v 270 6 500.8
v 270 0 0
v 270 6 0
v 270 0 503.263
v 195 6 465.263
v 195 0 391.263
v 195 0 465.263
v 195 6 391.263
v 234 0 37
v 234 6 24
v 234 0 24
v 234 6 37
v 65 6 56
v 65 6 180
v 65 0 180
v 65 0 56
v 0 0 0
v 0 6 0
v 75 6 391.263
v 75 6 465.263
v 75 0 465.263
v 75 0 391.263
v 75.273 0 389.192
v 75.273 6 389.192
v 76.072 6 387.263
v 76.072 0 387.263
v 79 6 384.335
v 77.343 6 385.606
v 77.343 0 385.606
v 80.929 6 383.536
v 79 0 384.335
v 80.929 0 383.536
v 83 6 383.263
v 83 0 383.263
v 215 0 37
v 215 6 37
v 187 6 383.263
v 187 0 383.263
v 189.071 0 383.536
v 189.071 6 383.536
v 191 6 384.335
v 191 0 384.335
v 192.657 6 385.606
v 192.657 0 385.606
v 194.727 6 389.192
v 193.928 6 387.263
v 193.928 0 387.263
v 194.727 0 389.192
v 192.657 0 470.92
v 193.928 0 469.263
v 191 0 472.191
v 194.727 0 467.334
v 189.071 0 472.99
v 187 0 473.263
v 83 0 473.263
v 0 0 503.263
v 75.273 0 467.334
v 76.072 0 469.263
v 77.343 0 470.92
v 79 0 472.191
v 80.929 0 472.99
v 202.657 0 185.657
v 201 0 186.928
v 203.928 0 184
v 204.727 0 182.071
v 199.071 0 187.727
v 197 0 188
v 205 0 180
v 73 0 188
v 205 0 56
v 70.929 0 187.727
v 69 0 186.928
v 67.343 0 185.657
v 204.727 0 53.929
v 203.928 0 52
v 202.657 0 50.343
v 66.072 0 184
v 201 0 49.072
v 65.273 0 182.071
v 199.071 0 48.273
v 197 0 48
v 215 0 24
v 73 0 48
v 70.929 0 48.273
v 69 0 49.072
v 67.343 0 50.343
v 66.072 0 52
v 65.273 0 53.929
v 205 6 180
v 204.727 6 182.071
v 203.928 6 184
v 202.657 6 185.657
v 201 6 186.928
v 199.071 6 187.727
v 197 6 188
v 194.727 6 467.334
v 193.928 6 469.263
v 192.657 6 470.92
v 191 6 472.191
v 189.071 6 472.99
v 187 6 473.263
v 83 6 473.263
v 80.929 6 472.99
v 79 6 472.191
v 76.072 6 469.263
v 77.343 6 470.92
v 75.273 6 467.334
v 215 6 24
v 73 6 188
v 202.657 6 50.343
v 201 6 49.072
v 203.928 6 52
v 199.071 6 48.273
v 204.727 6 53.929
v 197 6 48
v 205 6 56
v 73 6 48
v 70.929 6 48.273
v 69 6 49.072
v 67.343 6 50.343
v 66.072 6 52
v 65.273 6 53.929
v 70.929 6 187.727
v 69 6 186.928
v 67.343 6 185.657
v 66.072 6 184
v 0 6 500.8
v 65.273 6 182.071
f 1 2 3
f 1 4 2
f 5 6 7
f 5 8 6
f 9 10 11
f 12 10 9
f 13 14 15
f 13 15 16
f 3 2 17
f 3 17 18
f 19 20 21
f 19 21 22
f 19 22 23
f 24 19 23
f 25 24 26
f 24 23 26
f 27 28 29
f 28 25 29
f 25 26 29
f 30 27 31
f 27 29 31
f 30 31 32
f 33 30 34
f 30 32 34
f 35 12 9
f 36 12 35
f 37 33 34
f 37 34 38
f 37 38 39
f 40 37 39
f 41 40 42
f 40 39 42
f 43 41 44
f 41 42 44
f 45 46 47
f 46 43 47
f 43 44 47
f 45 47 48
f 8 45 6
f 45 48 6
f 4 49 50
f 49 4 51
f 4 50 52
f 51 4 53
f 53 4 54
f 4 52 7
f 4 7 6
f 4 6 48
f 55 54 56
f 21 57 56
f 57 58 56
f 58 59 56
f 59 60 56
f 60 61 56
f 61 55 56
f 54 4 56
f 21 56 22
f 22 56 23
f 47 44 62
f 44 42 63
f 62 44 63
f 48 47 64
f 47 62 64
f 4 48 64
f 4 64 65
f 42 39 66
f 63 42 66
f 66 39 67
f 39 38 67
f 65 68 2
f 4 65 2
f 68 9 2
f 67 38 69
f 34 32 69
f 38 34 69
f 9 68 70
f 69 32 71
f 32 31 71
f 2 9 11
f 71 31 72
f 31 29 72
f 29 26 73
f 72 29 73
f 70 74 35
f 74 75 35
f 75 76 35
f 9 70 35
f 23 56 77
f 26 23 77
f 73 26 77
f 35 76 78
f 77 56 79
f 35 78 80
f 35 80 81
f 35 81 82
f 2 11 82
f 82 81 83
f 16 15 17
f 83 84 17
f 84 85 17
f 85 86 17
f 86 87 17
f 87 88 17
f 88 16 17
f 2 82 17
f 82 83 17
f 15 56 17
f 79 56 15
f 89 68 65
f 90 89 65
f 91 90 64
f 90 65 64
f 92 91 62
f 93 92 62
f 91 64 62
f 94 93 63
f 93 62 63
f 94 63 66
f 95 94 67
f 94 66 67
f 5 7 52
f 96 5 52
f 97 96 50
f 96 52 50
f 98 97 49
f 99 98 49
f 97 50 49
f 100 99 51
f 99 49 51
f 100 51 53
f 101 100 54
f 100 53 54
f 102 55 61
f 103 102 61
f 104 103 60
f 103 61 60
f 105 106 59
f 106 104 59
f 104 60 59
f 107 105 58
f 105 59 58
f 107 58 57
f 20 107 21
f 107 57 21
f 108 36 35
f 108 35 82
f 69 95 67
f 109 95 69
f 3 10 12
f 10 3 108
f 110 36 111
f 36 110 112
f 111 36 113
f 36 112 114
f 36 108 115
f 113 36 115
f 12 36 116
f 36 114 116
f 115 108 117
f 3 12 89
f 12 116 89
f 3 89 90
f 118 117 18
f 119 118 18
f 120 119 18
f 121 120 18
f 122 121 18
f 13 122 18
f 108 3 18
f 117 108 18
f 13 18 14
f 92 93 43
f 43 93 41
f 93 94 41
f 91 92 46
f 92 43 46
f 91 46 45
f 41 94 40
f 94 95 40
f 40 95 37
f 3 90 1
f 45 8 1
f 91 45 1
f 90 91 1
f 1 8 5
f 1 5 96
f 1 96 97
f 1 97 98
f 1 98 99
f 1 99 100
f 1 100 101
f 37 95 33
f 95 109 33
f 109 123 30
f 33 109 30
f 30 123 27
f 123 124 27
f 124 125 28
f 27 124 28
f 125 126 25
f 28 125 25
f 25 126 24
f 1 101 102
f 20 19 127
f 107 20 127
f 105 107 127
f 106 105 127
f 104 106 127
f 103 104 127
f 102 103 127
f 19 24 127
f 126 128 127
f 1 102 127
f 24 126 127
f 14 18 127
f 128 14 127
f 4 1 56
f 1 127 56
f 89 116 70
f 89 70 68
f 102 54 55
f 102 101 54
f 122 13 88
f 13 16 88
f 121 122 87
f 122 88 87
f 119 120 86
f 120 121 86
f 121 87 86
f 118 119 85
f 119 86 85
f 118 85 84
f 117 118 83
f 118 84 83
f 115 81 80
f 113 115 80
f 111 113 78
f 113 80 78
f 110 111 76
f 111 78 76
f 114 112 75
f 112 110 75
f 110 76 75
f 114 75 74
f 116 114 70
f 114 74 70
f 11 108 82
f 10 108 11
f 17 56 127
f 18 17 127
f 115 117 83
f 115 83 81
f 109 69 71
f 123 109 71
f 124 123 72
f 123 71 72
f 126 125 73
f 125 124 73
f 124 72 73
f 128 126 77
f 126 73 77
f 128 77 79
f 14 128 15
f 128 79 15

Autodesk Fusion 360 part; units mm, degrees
sketch "Back Panel" plane through (0, 0, 0) normal (1, 0, 0) x (0, 1, 0)
  line L0 (0, 0) -> (6, 0)
  line L1 (6, 0) -> (6, 500.8)
  line L2 (0, 500.8) -> (0, 0)
  line L3 (0, 500.8) -> (0, 503.263)
  line L4 (6, 500.8) -> (0, 503.263)
  dimension "d8" = 6
  dimension "d9" = 500.8
  dimension "d10" = 2.463
  dimension "d11" = 112.318
extrude "Extrude2" add sketch "Back Panel" along normal blind 270
sketch "Switch Hole" plane through (0, 6, 0) normal (0, 1, 0) x (-1, 0, 0)
  line L0 (0, 0) -> (0, 500.8)
  line L1 (0, 500.8) -> (-270, 500.8)
  line L2 (-270, 500.8) -> (-270, 0)
  line L3 (-270, 0) -> (0, 0)
  line L4 (-234, 37) -> (-215, 37)
  line L5 (-215, 37) -> (-215, 24)
  line L6 (-215, 24) -> (-234, 24)
  line L7 (-234, 24) -> (-234, 37)
  dimension "d14" = 19
  dimension "d15" = 13
  dimension "d16" = 36
  dimension "d17" = 24
extrude "Extrude3" cut sketch "Switch Hole" against normal blind 6 contours L4 L5 L6 L7
sketch "Bottom Access Panel" plane through (0, 6, 0) normal (0, 1, 0) x (-1, 0, 0)
  line L0 (-215, 37) -> (-215, 24)
  line L1 (-215, 24) -> (-234, 24)
  line L2 (-234, 24) -> (-234, 37)
  line L3 (-234, 37) -> (-215, 37)
  line L4 (0, 0) -> (0, 500.8)
  line L5 (0, 500.8) -> (-270, 500.8)
  line L6 (-270, 500.8) -> (-270, 0)
  line L7 (-270, 0) -> (0, 0)
  line L8 (-205, 188) -> (-65, 188)
  line L9 (-65, 188) -> (-65, 48)
  line L10 (-65, 48) -> (-205, 48)
  line L11 (-205, 48) -> (-205, 188)
  dimension "d20" = 48
  dimension "d21" = 65
  dimension "d22" = 65
  dimension "d28" = 140
  dimension "d29" = 140
  dimension "d30" = 24
  dimension "d31" = 11
  dimension "d32" = 13
  dimension "d33" = 188
extrude "Extrude4" cut sketch "Bottom Access Panel" against normal blind 6 contours L8 L9 L10 L11
fillet "Fillet1" radius 8 4 edges at (65, 3, 188) (65, 3, 48) (205, 3, 48) (205, 3, 188)
sketch "Top Access Panel" plane through (0, 6, 0) normal (0, 1, 0) x (-1, 0, 0)
  line L0 (-65, 180) -> (-65, 56)
  arc A0 (-73, 48) -> (-65, 56) centre (-73, 56) ccw
  line L1 (-73, 48) -> (-197, 48)
  arc A1 (-205, 56) -> (-197, 48) centre (-197, 56) ccw
  line L2 (-205, 56) -> (-205, 180)
  arc A2 (-197, 188) -> (-205, 180) centre (-197, 180) ccw
  line L3 (-197, 188) -> (-73, 188)
  arc A3 (-65, 180) -> (-73, 188) centre (-73, 180) ccw
  line L4 (-215, 37) -> (-215, 24)
  line L5 (-215, 24) -> (-234, 24)
  line L6 (-234, 24) -> (-234, 37)
  line L7 (-234, 37) -> (-215, 37)
  line L8 (0, 0) -> (0, 500.8)
  line L9 (0, 500.8) -> (-270, 500.8)
  line L10 (-270, 500.8) -> (-270, 0)
  line L11 (-270, 0) -> (0, 0)
  line L12 (-195, 473.263) -> (-75, 473.263)
  line L13 (-75, 473.263) -> (-75, 383.263)
  line L14 (-75, 383.263) -> (-195, 383.263)
  line L15 (-195, 383.263) -> (-195, 473.263)
  line L16 (-180, 473.263) -> (-90, 473.263)
  line L17 (0, 503.263) -> (-270, 503.263)
  dimension "d34" = 120
  dimension "d35" = 140
  dimension "d36" = 75
  dimension "d37" = 75
  dimension "d38" = 65
  dimension "d39" = 65
  dimension "d45" = 90
  dimension "d49" = 30
extrude "Extrude5" cut sketch "Top Access Panel" against normal blind 6 contours L12 L13 L14 L15 L16
fillet "Fillet2" radius 8 4 edges at (75, 3, 473.263) (195, 3, 473.263) (195, 3, 383.263) (75, 3, 383.263)
equation "MDFThickness = 6 mm" comment "Thickness of the MDF board"
equation "d16 = ( 18 * 2 ) * 1 mm"
equation "d17 = ( 12 * 2 ) * 1 mm"
equation "d18 = -MDFThickness"
equation "d23 = -MDFThickness"
equation "filletRadius = 8 mm" comment "Radius to use for fillets"
equation "d27 = filletRadius"
equation "d36 = ( ( 270 - 120 ) / 2 ) * 1 mm"
equation "d51 = -MDFThickness"
equation "d54 = filletRadius"
